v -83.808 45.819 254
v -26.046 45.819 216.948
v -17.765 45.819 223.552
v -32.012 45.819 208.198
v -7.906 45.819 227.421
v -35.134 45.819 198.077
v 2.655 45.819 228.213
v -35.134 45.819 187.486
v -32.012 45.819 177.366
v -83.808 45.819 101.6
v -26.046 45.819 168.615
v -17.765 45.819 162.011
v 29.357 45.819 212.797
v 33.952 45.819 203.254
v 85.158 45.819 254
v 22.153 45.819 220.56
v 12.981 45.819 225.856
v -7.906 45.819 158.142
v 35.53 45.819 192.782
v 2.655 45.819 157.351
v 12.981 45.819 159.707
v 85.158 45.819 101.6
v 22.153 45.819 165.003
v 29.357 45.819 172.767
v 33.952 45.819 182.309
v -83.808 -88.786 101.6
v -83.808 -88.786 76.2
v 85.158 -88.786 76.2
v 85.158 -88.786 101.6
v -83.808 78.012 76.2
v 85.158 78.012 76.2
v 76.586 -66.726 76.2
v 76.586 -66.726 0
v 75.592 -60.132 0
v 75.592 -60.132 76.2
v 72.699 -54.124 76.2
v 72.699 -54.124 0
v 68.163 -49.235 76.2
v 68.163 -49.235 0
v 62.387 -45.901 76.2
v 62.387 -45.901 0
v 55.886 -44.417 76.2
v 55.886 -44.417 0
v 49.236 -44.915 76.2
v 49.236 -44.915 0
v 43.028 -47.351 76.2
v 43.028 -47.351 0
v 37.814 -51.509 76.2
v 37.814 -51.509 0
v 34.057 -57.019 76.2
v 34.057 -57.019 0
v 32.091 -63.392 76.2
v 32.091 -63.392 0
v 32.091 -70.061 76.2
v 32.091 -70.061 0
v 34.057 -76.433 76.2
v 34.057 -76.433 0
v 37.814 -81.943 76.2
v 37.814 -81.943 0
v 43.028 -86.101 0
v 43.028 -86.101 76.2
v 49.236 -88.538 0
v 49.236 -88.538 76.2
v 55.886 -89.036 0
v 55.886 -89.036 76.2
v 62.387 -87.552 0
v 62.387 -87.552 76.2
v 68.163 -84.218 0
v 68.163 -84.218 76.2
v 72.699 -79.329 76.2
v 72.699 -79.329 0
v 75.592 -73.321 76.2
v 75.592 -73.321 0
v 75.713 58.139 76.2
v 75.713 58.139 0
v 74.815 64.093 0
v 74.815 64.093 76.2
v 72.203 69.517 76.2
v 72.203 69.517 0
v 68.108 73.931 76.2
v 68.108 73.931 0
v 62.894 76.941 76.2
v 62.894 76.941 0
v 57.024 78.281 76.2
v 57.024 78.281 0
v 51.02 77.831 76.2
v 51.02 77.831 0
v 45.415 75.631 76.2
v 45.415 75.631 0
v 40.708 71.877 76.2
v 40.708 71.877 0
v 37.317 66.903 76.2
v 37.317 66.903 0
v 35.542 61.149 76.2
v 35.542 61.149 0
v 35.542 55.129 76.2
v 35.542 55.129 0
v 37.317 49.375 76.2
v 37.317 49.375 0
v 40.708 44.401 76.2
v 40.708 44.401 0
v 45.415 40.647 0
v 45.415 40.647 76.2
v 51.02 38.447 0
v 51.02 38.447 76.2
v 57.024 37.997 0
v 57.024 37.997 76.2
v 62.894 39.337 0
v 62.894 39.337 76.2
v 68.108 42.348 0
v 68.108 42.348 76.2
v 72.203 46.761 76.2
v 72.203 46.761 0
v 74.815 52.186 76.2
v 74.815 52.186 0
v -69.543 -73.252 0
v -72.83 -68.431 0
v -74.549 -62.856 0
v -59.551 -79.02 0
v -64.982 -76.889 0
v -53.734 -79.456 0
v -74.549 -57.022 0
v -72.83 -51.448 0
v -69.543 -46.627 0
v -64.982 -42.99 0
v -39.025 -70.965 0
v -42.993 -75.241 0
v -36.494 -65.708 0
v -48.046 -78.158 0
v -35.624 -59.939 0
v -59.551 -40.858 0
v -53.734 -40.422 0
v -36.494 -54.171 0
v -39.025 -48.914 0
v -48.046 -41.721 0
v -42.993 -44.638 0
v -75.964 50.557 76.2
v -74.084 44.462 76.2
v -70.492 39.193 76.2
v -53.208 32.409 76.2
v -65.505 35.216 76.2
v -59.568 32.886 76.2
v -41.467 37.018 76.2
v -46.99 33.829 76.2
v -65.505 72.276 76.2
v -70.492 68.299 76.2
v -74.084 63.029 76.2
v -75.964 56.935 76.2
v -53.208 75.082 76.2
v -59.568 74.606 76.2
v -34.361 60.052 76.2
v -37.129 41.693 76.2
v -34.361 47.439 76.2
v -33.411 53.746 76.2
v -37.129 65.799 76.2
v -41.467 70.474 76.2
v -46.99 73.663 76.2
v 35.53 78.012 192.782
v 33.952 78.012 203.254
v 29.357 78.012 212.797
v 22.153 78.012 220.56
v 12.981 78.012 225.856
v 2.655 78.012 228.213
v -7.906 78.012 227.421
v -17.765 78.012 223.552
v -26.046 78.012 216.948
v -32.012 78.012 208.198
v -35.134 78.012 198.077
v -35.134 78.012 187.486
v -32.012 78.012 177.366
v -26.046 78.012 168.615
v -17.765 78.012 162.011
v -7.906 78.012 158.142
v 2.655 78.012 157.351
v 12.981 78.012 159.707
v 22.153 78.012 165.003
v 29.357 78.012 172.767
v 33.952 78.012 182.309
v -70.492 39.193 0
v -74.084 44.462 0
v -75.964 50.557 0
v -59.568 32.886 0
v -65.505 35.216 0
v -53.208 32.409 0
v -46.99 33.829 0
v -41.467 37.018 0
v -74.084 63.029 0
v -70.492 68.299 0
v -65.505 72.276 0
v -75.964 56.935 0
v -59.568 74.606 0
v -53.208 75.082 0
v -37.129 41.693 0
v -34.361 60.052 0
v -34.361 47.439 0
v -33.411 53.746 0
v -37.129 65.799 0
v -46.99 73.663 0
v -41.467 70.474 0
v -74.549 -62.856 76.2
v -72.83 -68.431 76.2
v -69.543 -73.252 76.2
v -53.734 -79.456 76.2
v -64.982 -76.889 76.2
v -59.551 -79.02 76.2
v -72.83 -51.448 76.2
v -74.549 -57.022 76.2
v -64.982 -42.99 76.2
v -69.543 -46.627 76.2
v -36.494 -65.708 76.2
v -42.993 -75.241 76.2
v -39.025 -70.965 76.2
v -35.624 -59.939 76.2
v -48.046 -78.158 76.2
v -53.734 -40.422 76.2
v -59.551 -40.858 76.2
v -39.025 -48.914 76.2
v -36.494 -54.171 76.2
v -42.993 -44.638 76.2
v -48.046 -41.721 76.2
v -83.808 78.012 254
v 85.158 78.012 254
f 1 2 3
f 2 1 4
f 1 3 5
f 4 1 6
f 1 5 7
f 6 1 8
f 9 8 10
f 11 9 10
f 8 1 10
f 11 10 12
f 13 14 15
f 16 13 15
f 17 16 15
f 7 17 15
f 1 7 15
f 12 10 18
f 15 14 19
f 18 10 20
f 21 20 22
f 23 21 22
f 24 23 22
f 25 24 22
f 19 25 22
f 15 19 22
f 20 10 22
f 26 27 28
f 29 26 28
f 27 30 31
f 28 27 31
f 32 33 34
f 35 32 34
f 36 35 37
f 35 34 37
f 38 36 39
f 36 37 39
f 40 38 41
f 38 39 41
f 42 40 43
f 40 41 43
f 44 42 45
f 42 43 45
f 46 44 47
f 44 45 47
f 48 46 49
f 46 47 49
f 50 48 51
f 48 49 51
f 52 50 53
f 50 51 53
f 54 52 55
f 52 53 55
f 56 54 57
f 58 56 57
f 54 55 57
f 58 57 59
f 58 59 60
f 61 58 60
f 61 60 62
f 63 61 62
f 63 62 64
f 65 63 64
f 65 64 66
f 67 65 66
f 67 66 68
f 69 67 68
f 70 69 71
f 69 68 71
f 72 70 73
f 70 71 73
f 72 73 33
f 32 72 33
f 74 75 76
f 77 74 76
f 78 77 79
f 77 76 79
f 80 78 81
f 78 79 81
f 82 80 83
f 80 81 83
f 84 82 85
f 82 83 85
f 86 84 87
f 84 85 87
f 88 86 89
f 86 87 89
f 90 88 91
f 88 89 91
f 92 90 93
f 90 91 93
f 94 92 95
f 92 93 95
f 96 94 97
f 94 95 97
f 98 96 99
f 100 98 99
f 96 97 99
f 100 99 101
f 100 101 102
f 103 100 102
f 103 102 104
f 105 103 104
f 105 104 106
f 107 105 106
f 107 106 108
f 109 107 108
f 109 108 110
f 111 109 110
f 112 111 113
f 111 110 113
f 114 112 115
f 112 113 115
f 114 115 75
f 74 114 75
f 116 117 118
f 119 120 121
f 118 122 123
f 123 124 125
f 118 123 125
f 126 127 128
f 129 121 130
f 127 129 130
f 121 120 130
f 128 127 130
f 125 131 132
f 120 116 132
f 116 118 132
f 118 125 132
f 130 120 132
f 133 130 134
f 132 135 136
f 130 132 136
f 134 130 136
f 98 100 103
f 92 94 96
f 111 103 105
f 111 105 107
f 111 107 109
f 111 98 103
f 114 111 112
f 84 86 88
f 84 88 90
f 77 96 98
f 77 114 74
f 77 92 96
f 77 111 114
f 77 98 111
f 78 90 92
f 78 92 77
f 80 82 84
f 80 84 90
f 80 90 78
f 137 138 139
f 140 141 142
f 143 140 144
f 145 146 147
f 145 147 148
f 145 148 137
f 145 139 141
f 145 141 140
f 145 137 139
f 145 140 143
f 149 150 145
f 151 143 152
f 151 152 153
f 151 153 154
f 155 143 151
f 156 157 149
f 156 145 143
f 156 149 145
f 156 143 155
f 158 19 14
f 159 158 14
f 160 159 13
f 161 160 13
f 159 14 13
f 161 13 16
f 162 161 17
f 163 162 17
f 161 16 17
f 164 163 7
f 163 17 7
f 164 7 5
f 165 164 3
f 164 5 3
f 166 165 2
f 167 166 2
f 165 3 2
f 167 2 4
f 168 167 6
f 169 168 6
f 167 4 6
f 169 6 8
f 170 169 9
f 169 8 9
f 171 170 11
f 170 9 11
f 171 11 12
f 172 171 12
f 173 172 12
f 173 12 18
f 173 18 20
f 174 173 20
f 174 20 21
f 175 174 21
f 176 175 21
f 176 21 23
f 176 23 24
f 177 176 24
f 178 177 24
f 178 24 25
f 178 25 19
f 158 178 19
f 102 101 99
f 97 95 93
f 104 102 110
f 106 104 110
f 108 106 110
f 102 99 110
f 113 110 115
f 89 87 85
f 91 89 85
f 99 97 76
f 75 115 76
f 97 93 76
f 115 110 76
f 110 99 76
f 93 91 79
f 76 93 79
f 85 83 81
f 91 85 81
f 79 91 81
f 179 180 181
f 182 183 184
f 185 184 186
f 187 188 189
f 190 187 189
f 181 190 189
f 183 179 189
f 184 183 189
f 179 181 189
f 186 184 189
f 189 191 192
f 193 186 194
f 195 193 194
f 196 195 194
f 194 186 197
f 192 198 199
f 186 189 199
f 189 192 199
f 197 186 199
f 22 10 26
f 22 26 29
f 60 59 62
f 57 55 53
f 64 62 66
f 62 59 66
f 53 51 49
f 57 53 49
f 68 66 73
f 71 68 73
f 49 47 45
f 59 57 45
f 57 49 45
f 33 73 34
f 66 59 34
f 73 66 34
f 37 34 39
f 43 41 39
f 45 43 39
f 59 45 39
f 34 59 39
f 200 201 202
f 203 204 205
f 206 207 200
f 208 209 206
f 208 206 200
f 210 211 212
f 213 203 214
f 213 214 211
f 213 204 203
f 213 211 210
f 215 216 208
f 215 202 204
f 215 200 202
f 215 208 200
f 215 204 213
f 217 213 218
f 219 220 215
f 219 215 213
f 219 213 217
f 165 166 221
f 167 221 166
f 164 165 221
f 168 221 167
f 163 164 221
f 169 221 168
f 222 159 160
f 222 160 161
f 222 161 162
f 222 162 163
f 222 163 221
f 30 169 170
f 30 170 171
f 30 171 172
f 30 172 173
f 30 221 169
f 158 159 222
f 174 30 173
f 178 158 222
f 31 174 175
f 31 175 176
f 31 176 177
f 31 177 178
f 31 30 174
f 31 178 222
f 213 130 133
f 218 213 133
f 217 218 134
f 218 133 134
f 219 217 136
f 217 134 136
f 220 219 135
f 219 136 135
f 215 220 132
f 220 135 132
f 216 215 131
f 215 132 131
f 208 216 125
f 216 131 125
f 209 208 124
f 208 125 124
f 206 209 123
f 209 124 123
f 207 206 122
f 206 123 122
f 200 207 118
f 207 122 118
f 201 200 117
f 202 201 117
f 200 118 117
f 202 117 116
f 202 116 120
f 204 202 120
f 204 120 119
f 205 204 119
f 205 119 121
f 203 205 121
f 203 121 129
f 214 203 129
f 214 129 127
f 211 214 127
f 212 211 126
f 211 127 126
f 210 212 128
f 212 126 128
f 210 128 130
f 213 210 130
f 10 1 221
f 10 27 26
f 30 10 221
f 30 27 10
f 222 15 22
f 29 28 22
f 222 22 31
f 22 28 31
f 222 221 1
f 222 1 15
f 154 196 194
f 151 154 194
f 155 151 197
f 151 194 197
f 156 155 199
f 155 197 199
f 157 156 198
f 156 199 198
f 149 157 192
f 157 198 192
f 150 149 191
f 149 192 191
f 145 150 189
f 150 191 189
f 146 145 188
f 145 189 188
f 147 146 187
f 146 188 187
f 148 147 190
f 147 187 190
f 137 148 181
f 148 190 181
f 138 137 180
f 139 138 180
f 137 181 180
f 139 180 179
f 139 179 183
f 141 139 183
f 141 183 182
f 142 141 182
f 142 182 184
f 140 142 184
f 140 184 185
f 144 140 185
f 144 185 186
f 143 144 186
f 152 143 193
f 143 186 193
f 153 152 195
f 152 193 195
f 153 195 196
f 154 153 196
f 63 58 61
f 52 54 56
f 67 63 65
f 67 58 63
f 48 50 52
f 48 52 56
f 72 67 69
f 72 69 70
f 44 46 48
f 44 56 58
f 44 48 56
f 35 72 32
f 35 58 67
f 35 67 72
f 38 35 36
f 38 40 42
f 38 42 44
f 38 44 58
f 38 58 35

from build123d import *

# Parameters (mm, degrees)
F0_R     = 22.3722727972
F1_DEPTH = 76.2
F0_R_2   = 20.1981142989
F0_R_3   = 21.3962537525
F0_R_4   = 19.571730167
F2_W     = 168.9652204514
F2_H     = 166.7985022068
F3_DEPTH = 25.4
F4_W     = 168.9652204514
F4_H     = 32.19390288
F5_DEPTH = 152.4
F6_R     = 35.5303474838
F7_DEPTH = 101.6


with BuildPart() as f1:
    # F0 (on Top) → F1 (new body)
    with BuildSketch(Plane.XY):
        with Locations((54.2138777673, -66.7263194919)):
            Circle(F0_R)
    extrude(amount=F1_DEPTH)


with BuildPart() as f1b:
    # F0 (on Top) → F1, piece 2 (new body)
    with BuildSketch(Plane.XY):
        with Locations((55.5144324899, 58.139115572)):
            Circle(F0_R_2)
    extrude(amount=F1_DEPTH)


with BuildPart() as f1c:
    # F0 (on Top) → F1, piece 3 (new body)
    with BuildSketch(Plane.XY):
        with Locations((-54.8070818186, 53.7458285689)):
            Circle(F0_R_3)
    extrude(amount=F1_DEPTH)


with BuildPart() as f1d:
    # F0 (on Top) → F1, piece 4 (new body)
    with BuildSketch(Plane.XY):
        with Locations((-55.1961921155, -59.9394589663)):
            Circle(F0_R_4)
    extrude(amount=F1_DEPTH)


with BuildPart() as f3:
    # F2 (on face) → F3 (new body)
    with BuildSketch(Plane.XY.offset(76.2)):
        with Locations((0.6749108434, -5.386762321)):
            Rectangle(F2_W, F2_H)
    extrude(amount=F3_DEPTH)

    # F4 (on face) → F5 (join)
    with BuildSketch(Plane.XY.offset(101.6)):
        with Locations((0.6749108434, 61.9155373424)):
            Rectangle(F4_W, F4_H)
    extrude(amount=F5_DEPTH)

    # F6 (on face) → F7 (cut)
    with BuildSketch(Plane.XZ.offset(-45.8185859025)):
        with Locations((0, 192.7815526724)):
            Circle(F6_R)
    extrude(amount=-F7_DEPTH, mode=Mode.SUBTRACT)


solid = Compound([f1.part, f1b.part, f1c.part, f1d.part, f3.part])
